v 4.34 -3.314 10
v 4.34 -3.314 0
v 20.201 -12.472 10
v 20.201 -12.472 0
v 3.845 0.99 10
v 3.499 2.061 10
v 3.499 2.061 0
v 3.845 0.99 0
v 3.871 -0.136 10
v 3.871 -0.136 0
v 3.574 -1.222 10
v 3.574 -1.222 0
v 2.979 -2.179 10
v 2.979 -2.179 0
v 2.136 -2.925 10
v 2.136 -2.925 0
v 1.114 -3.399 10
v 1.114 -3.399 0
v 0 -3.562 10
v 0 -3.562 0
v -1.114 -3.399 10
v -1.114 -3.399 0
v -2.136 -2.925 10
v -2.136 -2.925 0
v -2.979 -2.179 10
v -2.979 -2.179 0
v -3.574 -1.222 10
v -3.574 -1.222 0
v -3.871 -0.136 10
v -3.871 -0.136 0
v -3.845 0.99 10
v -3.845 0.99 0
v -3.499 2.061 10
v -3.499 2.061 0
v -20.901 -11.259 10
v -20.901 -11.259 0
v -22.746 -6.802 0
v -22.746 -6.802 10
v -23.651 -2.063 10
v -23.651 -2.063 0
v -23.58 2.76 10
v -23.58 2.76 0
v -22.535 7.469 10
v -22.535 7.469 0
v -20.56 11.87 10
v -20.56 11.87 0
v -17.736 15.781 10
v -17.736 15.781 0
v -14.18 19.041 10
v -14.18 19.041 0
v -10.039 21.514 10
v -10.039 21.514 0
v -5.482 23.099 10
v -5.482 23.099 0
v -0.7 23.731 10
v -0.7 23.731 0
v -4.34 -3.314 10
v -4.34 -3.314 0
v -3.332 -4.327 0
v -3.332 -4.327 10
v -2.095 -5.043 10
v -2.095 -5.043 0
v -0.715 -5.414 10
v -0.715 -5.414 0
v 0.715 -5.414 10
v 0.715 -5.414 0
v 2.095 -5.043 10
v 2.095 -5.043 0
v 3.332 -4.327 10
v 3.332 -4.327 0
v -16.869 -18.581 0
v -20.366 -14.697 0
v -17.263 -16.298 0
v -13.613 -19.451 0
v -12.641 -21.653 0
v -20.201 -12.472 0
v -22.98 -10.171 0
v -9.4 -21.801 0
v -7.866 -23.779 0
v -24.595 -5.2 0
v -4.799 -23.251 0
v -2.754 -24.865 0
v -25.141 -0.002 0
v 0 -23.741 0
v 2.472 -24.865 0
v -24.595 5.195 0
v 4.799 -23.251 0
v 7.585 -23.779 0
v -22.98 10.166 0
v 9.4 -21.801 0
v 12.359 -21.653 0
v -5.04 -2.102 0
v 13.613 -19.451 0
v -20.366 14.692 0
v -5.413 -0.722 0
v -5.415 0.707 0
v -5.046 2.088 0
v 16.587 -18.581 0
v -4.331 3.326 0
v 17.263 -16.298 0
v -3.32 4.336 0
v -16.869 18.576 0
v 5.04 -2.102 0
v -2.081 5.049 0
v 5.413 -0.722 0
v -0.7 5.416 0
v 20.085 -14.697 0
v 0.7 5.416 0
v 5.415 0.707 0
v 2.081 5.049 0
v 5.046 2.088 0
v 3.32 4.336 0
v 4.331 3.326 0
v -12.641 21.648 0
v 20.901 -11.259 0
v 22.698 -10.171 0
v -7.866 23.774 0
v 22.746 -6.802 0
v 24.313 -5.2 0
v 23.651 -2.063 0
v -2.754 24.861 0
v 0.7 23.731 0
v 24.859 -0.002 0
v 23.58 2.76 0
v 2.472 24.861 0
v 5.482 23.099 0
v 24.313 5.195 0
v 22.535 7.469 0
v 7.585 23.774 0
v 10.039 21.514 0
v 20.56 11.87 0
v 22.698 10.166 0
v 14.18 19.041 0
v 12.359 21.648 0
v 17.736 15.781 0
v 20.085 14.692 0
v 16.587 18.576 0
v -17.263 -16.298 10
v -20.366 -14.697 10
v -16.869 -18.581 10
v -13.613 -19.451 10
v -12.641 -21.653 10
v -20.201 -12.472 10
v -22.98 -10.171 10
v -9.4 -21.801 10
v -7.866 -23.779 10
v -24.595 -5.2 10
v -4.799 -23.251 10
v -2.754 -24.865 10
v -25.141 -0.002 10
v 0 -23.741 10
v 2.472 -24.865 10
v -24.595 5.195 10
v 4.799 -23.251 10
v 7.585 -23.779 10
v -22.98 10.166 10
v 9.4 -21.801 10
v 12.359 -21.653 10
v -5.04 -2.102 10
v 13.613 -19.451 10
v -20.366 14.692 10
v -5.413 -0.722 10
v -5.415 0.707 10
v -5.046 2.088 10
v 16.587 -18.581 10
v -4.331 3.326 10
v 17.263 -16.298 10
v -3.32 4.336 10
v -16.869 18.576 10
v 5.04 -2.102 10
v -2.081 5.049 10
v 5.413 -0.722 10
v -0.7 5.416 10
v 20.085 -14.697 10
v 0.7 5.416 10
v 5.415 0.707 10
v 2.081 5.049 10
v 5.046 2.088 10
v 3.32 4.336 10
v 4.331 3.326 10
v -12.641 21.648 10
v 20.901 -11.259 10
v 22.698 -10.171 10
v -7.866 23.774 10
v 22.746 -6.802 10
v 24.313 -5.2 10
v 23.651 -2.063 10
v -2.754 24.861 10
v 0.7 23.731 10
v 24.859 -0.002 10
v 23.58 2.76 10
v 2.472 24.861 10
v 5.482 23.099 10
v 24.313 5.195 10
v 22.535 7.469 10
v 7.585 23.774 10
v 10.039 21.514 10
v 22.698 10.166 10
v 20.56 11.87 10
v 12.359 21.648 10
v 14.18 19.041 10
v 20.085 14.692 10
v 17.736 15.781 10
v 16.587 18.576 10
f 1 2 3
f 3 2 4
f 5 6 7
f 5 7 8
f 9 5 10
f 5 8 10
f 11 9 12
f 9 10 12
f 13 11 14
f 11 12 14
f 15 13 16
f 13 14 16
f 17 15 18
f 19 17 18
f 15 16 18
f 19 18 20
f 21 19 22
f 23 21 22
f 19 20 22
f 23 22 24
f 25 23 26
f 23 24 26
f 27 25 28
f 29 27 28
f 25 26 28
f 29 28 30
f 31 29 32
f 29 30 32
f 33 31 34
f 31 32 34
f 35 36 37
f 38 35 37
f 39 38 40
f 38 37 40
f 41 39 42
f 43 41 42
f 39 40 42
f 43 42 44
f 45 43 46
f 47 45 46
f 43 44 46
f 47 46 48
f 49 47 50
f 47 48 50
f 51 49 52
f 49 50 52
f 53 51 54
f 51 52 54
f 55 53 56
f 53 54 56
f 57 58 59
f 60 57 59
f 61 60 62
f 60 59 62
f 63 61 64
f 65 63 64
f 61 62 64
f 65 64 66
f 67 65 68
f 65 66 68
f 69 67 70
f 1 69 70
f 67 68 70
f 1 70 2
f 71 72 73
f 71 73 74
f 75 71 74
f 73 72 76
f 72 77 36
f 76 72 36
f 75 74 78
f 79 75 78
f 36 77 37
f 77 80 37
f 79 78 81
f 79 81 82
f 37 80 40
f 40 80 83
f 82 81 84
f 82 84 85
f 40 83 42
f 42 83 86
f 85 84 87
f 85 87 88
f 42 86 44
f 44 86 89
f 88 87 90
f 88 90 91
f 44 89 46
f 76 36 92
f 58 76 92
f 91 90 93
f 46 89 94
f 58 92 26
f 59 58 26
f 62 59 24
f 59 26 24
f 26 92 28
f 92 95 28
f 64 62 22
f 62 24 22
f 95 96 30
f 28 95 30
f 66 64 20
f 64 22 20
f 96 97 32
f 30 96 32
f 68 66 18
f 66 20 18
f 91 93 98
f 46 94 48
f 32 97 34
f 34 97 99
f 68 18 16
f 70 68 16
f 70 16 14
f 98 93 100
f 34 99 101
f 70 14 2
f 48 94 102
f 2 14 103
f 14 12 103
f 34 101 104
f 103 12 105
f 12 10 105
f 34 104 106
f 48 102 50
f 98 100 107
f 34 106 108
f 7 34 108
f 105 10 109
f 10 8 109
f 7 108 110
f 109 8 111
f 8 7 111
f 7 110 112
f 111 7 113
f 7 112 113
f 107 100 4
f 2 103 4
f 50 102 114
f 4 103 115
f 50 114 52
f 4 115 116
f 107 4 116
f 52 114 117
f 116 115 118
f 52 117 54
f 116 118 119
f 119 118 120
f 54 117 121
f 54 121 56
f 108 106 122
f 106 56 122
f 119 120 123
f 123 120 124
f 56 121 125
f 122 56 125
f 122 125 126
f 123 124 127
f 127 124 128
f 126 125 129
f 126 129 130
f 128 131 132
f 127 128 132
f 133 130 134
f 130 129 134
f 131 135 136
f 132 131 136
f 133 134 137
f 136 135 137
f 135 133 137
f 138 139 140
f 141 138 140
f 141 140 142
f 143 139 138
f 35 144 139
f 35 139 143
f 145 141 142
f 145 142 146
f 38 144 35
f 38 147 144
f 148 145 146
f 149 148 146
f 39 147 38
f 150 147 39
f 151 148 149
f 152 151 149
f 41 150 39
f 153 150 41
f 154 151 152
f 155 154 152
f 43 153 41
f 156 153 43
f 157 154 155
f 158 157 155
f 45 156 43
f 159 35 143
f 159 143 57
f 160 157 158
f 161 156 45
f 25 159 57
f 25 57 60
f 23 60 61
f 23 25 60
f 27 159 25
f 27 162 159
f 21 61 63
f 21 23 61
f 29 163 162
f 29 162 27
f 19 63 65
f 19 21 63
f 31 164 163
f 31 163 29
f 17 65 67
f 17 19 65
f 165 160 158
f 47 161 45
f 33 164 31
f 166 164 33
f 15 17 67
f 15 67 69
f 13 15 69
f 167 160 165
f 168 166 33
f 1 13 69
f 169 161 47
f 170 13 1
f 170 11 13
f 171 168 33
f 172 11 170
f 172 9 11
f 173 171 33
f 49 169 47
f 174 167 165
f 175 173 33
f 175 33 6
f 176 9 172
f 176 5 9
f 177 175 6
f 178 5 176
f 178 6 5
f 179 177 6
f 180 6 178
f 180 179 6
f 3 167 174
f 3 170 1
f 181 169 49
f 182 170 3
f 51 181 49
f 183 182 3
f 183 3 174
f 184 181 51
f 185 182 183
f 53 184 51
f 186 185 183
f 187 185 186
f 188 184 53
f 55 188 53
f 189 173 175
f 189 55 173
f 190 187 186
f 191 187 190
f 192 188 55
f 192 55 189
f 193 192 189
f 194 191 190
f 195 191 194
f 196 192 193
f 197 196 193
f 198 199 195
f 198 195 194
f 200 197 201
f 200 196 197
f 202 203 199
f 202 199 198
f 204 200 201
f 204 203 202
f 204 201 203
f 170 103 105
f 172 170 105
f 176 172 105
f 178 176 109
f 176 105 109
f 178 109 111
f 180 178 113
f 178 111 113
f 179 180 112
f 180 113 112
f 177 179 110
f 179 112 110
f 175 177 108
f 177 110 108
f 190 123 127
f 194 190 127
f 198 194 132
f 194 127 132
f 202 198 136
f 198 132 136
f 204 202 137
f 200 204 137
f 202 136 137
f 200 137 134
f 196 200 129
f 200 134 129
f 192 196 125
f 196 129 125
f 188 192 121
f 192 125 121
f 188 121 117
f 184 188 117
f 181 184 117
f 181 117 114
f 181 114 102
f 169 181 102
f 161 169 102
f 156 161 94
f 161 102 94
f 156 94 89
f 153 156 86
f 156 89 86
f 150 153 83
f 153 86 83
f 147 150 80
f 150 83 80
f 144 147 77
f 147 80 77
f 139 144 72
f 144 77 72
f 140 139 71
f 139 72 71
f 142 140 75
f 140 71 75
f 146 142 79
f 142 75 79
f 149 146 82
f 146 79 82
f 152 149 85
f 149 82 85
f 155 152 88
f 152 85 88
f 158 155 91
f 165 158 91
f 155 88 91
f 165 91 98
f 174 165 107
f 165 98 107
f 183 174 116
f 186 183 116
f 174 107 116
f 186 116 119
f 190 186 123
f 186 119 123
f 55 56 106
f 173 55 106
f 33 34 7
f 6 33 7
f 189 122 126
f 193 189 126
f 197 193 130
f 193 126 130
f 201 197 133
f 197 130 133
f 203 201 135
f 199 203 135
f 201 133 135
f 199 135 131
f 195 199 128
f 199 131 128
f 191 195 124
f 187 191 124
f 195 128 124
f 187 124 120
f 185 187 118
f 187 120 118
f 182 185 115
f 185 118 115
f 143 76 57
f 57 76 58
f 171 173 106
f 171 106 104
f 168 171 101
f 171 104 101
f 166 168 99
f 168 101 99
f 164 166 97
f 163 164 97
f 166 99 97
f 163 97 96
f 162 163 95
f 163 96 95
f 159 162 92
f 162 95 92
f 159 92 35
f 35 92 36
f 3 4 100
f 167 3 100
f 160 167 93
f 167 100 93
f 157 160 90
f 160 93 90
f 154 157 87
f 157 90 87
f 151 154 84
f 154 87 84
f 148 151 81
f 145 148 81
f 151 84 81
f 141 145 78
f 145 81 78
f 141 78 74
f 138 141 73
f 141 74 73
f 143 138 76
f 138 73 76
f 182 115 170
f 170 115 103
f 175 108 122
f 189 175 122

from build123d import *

# Parameters (mm, degrees)
F0_R     = 25
F1_DEPTH = 10


# Not quite as in the source:
# - a feature names something its author has since deleted; it is built from what else it names


with BuildPart() as f1:
    # F0 (on Top) → F1 (new body)
    with BuildSketch(Plane.XY):
        with Locations((-0.1409200142, -0.0023476887)):
            Circle(F0_R)
        with BuildLine():
            ThreePointArc((0.7, 23.7306175986), (17.033068856, 16.5380402997), (23.7409395688, 0))
            ThreePointArc((23.7409395688, 0), (23.0200904836, -5.8058286004), (20.9013176879, -11.2590910166))
            ThreePointArc((20.9013176879, -11.2590910166), (20.5602567763, -11.8704697844), (20.2013176879, -12.4715265819))
            ThreePointArc((20.2013176879, -12.4715265819), (0, -23.7409395688), (-20.2013176879, -12.4715265819))
            ThreePointArc((-20.2013176879, -12.4715265819), (-20.5602567763, -11.8704697844), (-20.9013176879, -11.2590910166))
            ThreePointArc((-20.9013176879, -11.2590910166), (-20.5602567763, 11.8704697844), (-0.7, 23.7306175986))
            ThreePointArc((-0.7, 23.7306175986), (0, 23.7409395688), (0.7, 23.7306175986))
        make_face(mode=Mode.SUBTRACT)
        with BuildLine():
            ThreePointArc((5.4607696164, 0), (4.1013743754, 3.6053755749), (0.7, 5.4157183091))
            ThreePointArc((0.7, 5.4157183091), (0.3507241153, 5.4494951508), (0, 5.4607696164))
            ThreePointArc((0, 5.4607696164), (-0.3507241153, 5.4494951508), (-0.7, 5.4157183091))
            ThreePointArc((-0.7, 5.4157183091), (-4.729165212, 2.7303848082), (-5.0401496354, -2.1016413719))
            ThreePointArc((-5.0401496354, -2.1016413719), (-4.8947632961, -2.4210115818), (-4.729165212, -2.7303848082))
            ThreePointArc((-4.729165212, -2.7303848082), (-4.5440391807, -3.028483569), (-4.3401496354, -3.3140769372))
            ThreePointArc((-4.3401496354, -3.3140769372), (0, -5.4607696164), (4.3401496354, -3.3140769372))
            ThreePointArc((4.3401496354, -3.3140769372), (4.5440391807, -3.028483569), (4.729165212, -2.7303848082))
            ThreePointArc((4.729165212, -2.7303848082), (4.8947632961, -2.4210115818), (5.0401496354, -2.1016413719))
            ThreePointArc((5.0401496354, -2.1016413719), (5.354582187, -1.0716596503), (5.4607696164, 0))
        make_face()
        with BuildLine():
            Line((-3.4987264855, 2.0612527399), (0, 2.0612527399))
            Line((0, 2.0612527399), (3.4987264855, 2.0612527399))
            ThreePointArc((3.4987264855, 2.0612527399), (0, -3.5618006487), (-3.4987264855, 2.0612527399))
        make_face(mode=Mode.SUBTRACT)
        with BuildLine():
            Line((-5.0401496354, -2.1016413719), (-20.9013176879, -11.2590910166))
            ThreePointArc((-20.9013176879, -11.2590910166), (-20.5602567763, -11.8704697844), (-20.2013176879, -12.4715265819))
            Line((-20.2013176879, -12.4715265819), (-4.3401496354, -3.3140769372))
            ThreePointArc((-4.3401496354, -3.3140769372), (-4.5440391807, -3.028483569), (-4.729165212, -2.7303848082))
            ThreePointArc((-4.729165212, -2.7303848082), (-4.8947632961, -2.4210115818), (-5.0401496354, -2.1016413719))
        make_face()
        with BuildLine():
            Line((0.7, 5.4157183091), (0.7, 23.7306175986))
            ThreePointArc((0.7, 23.7306175986), (0, 23.7409395688), (-0.7, 23.7306175986))
            Line((-0.7, 23.7306175986), (-0.7, 5.4157183091))
            ThreePointArc((-0.7, 5.4157183091), (-0.3507241153, 5.4494951508), (0, 5.4607696164))
            ThreePointArc((0, 5.4607696164), (0.3507241153, 5.4494951508), (0.7, 5.4157183091))
        make_face()
        with BuildLine():
            ThreePointArc((20.2013176879, -12.4715265819), (20.5602567763, -11.8704697844), (20.9013176879, -11.2590910166))
            Line((20.9013176879, -11.2590910166), (5.0401496354, -2.1016413719))
            ThreePointArc((5.0401496354, -2.1016413719), (4.8947632961, -2.4210115818), (4.729165212, -2.7303848082))
            ThreePointArc((4.729165212, -2.7303848082), (4.5440391807, -3.028483569), (4.3401496354, -3.3140769372))
            Line((4.3401496354, -3.3140769372), (20.2013176879, -12.4715265819))
        make_face()
    extrude(amount=F1_DEPTH)


solid = f1.part
